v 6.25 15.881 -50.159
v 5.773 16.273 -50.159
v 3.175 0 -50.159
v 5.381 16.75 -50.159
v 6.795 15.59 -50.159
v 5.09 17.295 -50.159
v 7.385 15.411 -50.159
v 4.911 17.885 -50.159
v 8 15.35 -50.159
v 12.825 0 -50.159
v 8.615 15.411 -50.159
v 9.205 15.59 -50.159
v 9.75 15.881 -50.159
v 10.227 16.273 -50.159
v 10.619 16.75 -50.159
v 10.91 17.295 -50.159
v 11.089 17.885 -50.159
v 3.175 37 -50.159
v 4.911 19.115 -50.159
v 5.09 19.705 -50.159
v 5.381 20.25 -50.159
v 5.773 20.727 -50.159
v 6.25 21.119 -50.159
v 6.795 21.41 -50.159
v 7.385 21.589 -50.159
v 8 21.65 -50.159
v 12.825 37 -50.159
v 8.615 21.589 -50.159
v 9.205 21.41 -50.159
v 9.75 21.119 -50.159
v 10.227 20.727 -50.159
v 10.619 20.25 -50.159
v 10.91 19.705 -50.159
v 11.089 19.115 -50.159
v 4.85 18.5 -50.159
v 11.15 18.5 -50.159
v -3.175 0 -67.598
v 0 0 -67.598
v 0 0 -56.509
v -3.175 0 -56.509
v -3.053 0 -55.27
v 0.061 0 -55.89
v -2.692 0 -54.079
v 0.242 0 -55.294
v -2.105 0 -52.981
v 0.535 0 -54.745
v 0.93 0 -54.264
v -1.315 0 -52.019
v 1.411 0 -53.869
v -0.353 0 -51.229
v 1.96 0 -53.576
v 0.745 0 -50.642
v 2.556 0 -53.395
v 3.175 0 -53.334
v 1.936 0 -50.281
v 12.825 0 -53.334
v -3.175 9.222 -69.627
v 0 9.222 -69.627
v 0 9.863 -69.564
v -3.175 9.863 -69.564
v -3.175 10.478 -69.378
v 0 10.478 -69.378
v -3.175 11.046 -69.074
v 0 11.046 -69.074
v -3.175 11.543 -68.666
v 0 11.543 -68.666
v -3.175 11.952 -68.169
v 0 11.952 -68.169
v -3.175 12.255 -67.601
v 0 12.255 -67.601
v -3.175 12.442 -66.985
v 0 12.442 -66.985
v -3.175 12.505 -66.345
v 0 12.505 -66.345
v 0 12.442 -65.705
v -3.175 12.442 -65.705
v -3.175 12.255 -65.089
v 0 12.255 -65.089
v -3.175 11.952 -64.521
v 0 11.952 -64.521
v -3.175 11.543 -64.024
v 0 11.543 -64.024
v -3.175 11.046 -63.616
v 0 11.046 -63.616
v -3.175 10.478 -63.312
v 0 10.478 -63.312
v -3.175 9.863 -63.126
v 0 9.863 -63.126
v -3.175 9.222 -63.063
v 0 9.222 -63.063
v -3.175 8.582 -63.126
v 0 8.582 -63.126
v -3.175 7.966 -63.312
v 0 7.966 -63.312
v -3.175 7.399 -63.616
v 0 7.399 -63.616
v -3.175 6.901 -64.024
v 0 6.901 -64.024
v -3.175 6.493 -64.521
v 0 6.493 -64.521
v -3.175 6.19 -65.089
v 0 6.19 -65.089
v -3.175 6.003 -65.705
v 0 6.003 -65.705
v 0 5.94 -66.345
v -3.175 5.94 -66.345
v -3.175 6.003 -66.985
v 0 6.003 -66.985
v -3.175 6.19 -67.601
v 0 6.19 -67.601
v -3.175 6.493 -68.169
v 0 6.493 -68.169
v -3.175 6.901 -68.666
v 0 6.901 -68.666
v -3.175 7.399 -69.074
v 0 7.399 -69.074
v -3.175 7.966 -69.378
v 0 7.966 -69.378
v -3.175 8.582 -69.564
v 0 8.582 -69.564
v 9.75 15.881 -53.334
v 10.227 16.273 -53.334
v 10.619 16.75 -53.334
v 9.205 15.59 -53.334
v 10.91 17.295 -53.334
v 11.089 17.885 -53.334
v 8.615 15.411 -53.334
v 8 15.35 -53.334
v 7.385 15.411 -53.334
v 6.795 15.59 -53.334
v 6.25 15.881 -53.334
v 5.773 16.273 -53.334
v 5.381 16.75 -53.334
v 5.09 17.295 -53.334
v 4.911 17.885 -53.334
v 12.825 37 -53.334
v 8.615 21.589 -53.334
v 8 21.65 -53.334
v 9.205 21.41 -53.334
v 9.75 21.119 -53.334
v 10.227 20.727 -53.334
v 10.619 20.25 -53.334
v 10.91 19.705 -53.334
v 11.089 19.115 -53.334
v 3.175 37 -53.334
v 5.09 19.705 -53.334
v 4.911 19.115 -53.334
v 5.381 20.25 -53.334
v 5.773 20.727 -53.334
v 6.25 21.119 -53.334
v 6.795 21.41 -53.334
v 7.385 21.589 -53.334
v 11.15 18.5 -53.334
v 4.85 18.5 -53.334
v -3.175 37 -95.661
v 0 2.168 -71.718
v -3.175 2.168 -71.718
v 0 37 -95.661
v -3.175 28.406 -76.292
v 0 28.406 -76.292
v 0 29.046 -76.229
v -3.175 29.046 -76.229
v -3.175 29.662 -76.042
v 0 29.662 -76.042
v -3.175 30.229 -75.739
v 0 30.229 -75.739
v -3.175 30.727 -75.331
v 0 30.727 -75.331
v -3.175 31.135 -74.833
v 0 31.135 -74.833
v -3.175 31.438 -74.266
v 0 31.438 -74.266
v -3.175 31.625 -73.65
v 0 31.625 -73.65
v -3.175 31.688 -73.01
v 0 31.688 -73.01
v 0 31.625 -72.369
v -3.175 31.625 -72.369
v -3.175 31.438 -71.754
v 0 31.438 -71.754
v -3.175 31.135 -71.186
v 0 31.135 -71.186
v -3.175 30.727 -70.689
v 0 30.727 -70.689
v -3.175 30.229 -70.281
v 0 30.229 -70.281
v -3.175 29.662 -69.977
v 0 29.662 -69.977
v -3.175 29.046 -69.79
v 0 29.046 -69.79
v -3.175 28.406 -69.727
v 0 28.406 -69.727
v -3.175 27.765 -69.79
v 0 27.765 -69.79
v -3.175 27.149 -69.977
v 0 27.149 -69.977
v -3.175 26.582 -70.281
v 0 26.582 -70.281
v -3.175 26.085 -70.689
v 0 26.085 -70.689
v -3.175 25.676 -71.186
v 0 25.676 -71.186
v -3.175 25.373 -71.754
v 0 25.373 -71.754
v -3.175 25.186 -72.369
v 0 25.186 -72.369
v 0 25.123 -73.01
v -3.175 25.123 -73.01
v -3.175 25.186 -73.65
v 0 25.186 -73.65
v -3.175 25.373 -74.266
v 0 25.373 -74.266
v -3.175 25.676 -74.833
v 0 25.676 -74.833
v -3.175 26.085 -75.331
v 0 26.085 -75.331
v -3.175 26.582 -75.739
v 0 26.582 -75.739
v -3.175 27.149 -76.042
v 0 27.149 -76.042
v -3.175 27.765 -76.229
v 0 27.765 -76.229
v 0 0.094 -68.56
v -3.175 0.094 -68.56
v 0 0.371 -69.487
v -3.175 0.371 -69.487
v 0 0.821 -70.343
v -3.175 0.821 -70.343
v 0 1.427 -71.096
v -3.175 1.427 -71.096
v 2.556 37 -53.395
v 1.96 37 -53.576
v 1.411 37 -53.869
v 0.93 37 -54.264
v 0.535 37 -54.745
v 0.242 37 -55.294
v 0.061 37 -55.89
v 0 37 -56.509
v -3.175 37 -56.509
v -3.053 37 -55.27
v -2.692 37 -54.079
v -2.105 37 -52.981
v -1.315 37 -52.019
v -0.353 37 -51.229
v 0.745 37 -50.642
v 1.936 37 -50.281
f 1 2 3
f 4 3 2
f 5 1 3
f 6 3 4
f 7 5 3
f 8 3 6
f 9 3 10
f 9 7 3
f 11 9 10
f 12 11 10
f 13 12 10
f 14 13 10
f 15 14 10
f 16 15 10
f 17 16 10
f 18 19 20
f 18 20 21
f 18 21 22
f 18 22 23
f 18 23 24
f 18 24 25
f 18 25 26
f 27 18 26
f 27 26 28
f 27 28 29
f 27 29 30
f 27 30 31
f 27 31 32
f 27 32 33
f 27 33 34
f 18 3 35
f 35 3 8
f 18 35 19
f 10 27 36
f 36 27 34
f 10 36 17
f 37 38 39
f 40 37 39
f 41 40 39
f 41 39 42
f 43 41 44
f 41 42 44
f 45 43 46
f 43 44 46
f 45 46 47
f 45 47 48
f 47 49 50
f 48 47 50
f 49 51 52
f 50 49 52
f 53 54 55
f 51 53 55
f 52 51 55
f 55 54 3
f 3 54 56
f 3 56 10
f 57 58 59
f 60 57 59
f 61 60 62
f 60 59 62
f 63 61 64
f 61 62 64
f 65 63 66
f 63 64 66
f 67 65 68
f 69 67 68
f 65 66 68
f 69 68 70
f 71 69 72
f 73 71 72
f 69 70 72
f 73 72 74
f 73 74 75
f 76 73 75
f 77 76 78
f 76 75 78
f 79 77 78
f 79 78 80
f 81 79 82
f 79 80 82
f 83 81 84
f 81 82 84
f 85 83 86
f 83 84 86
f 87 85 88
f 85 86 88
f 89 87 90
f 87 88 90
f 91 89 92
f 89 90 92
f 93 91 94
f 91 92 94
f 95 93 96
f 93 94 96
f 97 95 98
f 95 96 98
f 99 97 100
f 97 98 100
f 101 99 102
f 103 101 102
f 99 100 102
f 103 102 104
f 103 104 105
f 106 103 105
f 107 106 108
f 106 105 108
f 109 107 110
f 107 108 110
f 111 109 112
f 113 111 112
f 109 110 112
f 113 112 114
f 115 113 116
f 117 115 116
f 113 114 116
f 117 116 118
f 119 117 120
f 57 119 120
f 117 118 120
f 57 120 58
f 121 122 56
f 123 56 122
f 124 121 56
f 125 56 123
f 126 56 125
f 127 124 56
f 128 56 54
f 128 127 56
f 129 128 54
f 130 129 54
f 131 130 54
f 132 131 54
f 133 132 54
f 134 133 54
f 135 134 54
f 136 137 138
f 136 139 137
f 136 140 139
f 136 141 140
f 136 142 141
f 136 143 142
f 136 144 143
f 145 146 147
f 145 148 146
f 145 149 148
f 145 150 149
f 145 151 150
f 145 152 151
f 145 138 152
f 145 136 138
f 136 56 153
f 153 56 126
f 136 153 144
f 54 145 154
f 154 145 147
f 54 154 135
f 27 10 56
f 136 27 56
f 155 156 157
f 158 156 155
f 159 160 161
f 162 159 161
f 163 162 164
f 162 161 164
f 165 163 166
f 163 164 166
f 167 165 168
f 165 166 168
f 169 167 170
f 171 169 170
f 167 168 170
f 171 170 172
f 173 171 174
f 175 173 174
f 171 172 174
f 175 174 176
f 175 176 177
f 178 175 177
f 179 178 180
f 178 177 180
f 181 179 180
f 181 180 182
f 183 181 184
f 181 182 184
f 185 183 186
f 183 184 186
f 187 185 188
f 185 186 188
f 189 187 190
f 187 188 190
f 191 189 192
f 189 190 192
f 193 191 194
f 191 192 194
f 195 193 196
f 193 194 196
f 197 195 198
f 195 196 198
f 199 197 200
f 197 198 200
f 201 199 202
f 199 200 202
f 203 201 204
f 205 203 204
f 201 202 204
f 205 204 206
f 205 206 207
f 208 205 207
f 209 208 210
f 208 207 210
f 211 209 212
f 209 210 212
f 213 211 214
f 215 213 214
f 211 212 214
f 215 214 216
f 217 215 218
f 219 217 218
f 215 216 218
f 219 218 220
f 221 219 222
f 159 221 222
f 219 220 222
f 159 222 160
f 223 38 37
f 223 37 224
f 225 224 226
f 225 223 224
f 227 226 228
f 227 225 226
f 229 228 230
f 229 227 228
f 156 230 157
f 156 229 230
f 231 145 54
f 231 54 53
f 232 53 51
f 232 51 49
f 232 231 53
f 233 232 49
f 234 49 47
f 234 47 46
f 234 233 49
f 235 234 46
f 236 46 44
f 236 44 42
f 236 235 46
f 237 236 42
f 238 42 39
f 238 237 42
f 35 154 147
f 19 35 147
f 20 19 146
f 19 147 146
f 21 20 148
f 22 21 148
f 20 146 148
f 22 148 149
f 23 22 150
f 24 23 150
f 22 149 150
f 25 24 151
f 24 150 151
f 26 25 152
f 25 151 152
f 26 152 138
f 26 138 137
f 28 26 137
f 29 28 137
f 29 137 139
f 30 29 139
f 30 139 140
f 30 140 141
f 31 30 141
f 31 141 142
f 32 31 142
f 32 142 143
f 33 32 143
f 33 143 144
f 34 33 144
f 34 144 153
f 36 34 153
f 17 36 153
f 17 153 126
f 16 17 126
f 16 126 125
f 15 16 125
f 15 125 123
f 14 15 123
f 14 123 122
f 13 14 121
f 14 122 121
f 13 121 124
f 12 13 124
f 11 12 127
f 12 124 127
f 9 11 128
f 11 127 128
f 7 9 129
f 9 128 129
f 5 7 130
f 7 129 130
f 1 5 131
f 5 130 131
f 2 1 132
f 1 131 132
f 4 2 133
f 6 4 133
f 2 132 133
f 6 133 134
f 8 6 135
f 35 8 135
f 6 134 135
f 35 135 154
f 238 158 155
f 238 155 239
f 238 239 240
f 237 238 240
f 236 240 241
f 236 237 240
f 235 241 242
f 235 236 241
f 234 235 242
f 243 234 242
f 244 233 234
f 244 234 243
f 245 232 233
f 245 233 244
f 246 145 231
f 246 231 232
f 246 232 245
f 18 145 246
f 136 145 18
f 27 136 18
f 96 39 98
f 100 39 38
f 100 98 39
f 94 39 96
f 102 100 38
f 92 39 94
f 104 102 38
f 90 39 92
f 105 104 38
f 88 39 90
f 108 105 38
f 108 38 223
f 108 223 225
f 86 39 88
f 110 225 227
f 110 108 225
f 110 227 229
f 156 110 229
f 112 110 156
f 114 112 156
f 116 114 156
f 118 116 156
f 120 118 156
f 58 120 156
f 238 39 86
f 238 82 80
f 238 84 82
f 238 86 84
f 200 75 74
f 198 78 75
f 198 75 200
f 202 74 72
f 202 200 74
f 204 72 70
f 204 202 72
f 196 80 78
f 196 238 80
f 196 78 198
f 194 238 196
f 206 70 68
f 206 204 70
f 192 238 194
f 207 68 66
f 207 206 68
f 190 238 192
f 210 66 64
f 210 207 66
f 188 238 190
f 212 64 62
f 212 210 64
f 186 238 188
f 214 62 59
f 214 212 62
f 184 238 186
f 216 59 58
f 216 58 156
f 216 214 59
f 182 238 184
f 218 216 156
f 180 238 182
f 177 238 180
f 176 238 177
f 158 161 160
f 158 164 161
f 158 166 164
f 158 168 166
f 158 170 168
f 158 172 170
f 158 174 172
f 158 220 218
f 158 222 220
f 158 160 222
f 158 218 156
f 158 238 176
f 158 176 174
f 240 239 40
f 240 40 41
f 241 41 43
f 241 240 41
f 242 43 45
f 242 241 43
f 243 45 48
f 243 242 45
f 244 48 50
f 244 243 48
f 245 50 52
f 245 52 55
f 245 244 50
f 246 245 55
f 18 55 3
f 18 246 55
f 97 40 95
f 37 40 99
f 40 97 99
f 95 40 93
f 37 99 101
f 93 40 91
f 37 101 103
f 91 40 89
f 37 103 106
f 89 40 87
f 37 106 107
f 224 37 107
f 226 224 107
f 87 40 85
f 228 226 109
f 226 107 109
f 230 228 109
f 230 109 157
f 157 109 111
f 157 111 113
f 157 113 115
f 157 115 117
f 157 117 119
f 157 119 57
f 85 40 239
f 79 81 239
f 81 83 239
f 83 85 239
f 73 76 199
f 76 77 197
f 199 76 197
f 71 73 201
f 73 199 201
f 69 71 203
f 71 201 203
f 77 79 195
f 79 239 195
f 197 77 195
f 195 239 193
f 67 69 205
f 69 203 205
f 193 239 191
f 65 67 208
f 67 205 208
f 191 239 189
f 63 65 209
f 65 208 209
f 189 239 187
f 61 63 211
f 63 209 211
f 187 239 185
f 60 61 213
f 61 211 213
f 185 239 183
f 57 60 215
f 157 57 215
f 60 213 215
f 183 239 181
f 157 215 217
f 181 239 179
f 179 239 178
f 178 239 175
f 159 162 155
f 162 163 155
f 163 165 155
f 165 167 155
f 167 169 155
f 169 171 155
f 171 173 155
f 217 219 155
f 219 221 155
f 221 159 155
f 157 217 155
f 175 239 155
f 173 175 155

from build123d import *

# Parameters (mm, degrees)
SKETCH2_R                    = 3.282457618
BASE_FLANGE1_DEPTH           = 3.175
EDGE_FLANGE1_STRIP_W         = 19.05
EDGE_FLANGE1_STRIP_H         = 3.175
EDGE_FLANGE1_STRIP_CUT_DEPTH = 37
EDGE_FLANGE1_DEPTH           = 37
SKETCH6_R                    = 3.15
CUT_EXTRUDE1_DEPTH           = 10


# Sheet-metal steps are written as plain solids
with BuildPart() as part:
    # Sketch2 → Base-Flange1 (new body)
    with BuildSketch(Plane(origin=(0, 0, 0), x_dir=(0, 0, -1), z_dir=(1, 0, 0))):
        with BuildLine():
            Line((50.159054546, 37), (50.159054546, 0))
            Line((50.159054546, 0), (67.597909272, 0))
            ThreePointArc((67.597909272, 0), (69.925870777, 0.575003364), (71.718398003, 2.167761907))
            Line((71.718398003, 2.167761907), (95.660507303, 37))
            Line((95.660507303, 37), (50.159054546, 37))
        make_face()
        with Locations((73.009854993, 28.405566411)):
            Circle(SKETCH2_R, mode=Mode.SUBTRACT)
        with Locations((66.344990455, 9.222294526)):
            Circle(SKETCH2_R, mode=Mode.SUBTRACT)
    extrude(amount=-BASE_FLANGE1_DEPTH)

    # Edge-Flange1 strip (across the edge) → Edge-Flange1 strip cut (cut)
    with BuildSketch(Plane(origin=(0, 37, -50.159054546), x_dir=(0, 0, -1), z_dir=(0, -1, 0))):
        with Locations((-3.175, -1.5875)):
            Rectangle(EDGE_FLANGE1_STRIP_W, EDGE_FLANGE1_STRIP_H)
    extrude(amount=EDGE_FLANGE1_STRIP_CUT_DEPTH, mode=Mode.SUBTRACT)

    # Edge-Flange1 section (across the edge) → Edge-Flange1 (add)
    with BuildSketch(Plane(origin=(0, 37, -50.159054546), x_dir=(0, 0, -1), z_dir=(0, -1, 0))):
        with BuildLine():
            Line((0, 3.175), (0, 12.825))
            Line((0, 12.825), (3.175, 12.825))
            Line((3.175, 12.825), (3.175, 3.175))
            ThreePointArc((3.175, 3.175), (4.10493597, 0.92993597), (6.35, 0))
            Line((6.35, 0), (6.35, -3.175))
            ThreePointArc((6.35, -3.175), (1.859871939, -1.315128061), (0, 3.175))
        make_face()
    extrude(amount=EDGE_FLANGE1_DEPTH)

    # Sketch6 → Cut-Extrude1 (cut)
    with BuildSketch(Plane(origin=(0, 0, -53.334054546), x_dir=(-1, 0, 0), z_dir=(0, 0, -1))):
        with Locations((-8, 18.5)):
            Circle(SKETCH6_R)
    extrude(amount=-CUT_EXTRUDE1_DEPTH, mode=Mode.SUBTRACT)


solid = part.part
